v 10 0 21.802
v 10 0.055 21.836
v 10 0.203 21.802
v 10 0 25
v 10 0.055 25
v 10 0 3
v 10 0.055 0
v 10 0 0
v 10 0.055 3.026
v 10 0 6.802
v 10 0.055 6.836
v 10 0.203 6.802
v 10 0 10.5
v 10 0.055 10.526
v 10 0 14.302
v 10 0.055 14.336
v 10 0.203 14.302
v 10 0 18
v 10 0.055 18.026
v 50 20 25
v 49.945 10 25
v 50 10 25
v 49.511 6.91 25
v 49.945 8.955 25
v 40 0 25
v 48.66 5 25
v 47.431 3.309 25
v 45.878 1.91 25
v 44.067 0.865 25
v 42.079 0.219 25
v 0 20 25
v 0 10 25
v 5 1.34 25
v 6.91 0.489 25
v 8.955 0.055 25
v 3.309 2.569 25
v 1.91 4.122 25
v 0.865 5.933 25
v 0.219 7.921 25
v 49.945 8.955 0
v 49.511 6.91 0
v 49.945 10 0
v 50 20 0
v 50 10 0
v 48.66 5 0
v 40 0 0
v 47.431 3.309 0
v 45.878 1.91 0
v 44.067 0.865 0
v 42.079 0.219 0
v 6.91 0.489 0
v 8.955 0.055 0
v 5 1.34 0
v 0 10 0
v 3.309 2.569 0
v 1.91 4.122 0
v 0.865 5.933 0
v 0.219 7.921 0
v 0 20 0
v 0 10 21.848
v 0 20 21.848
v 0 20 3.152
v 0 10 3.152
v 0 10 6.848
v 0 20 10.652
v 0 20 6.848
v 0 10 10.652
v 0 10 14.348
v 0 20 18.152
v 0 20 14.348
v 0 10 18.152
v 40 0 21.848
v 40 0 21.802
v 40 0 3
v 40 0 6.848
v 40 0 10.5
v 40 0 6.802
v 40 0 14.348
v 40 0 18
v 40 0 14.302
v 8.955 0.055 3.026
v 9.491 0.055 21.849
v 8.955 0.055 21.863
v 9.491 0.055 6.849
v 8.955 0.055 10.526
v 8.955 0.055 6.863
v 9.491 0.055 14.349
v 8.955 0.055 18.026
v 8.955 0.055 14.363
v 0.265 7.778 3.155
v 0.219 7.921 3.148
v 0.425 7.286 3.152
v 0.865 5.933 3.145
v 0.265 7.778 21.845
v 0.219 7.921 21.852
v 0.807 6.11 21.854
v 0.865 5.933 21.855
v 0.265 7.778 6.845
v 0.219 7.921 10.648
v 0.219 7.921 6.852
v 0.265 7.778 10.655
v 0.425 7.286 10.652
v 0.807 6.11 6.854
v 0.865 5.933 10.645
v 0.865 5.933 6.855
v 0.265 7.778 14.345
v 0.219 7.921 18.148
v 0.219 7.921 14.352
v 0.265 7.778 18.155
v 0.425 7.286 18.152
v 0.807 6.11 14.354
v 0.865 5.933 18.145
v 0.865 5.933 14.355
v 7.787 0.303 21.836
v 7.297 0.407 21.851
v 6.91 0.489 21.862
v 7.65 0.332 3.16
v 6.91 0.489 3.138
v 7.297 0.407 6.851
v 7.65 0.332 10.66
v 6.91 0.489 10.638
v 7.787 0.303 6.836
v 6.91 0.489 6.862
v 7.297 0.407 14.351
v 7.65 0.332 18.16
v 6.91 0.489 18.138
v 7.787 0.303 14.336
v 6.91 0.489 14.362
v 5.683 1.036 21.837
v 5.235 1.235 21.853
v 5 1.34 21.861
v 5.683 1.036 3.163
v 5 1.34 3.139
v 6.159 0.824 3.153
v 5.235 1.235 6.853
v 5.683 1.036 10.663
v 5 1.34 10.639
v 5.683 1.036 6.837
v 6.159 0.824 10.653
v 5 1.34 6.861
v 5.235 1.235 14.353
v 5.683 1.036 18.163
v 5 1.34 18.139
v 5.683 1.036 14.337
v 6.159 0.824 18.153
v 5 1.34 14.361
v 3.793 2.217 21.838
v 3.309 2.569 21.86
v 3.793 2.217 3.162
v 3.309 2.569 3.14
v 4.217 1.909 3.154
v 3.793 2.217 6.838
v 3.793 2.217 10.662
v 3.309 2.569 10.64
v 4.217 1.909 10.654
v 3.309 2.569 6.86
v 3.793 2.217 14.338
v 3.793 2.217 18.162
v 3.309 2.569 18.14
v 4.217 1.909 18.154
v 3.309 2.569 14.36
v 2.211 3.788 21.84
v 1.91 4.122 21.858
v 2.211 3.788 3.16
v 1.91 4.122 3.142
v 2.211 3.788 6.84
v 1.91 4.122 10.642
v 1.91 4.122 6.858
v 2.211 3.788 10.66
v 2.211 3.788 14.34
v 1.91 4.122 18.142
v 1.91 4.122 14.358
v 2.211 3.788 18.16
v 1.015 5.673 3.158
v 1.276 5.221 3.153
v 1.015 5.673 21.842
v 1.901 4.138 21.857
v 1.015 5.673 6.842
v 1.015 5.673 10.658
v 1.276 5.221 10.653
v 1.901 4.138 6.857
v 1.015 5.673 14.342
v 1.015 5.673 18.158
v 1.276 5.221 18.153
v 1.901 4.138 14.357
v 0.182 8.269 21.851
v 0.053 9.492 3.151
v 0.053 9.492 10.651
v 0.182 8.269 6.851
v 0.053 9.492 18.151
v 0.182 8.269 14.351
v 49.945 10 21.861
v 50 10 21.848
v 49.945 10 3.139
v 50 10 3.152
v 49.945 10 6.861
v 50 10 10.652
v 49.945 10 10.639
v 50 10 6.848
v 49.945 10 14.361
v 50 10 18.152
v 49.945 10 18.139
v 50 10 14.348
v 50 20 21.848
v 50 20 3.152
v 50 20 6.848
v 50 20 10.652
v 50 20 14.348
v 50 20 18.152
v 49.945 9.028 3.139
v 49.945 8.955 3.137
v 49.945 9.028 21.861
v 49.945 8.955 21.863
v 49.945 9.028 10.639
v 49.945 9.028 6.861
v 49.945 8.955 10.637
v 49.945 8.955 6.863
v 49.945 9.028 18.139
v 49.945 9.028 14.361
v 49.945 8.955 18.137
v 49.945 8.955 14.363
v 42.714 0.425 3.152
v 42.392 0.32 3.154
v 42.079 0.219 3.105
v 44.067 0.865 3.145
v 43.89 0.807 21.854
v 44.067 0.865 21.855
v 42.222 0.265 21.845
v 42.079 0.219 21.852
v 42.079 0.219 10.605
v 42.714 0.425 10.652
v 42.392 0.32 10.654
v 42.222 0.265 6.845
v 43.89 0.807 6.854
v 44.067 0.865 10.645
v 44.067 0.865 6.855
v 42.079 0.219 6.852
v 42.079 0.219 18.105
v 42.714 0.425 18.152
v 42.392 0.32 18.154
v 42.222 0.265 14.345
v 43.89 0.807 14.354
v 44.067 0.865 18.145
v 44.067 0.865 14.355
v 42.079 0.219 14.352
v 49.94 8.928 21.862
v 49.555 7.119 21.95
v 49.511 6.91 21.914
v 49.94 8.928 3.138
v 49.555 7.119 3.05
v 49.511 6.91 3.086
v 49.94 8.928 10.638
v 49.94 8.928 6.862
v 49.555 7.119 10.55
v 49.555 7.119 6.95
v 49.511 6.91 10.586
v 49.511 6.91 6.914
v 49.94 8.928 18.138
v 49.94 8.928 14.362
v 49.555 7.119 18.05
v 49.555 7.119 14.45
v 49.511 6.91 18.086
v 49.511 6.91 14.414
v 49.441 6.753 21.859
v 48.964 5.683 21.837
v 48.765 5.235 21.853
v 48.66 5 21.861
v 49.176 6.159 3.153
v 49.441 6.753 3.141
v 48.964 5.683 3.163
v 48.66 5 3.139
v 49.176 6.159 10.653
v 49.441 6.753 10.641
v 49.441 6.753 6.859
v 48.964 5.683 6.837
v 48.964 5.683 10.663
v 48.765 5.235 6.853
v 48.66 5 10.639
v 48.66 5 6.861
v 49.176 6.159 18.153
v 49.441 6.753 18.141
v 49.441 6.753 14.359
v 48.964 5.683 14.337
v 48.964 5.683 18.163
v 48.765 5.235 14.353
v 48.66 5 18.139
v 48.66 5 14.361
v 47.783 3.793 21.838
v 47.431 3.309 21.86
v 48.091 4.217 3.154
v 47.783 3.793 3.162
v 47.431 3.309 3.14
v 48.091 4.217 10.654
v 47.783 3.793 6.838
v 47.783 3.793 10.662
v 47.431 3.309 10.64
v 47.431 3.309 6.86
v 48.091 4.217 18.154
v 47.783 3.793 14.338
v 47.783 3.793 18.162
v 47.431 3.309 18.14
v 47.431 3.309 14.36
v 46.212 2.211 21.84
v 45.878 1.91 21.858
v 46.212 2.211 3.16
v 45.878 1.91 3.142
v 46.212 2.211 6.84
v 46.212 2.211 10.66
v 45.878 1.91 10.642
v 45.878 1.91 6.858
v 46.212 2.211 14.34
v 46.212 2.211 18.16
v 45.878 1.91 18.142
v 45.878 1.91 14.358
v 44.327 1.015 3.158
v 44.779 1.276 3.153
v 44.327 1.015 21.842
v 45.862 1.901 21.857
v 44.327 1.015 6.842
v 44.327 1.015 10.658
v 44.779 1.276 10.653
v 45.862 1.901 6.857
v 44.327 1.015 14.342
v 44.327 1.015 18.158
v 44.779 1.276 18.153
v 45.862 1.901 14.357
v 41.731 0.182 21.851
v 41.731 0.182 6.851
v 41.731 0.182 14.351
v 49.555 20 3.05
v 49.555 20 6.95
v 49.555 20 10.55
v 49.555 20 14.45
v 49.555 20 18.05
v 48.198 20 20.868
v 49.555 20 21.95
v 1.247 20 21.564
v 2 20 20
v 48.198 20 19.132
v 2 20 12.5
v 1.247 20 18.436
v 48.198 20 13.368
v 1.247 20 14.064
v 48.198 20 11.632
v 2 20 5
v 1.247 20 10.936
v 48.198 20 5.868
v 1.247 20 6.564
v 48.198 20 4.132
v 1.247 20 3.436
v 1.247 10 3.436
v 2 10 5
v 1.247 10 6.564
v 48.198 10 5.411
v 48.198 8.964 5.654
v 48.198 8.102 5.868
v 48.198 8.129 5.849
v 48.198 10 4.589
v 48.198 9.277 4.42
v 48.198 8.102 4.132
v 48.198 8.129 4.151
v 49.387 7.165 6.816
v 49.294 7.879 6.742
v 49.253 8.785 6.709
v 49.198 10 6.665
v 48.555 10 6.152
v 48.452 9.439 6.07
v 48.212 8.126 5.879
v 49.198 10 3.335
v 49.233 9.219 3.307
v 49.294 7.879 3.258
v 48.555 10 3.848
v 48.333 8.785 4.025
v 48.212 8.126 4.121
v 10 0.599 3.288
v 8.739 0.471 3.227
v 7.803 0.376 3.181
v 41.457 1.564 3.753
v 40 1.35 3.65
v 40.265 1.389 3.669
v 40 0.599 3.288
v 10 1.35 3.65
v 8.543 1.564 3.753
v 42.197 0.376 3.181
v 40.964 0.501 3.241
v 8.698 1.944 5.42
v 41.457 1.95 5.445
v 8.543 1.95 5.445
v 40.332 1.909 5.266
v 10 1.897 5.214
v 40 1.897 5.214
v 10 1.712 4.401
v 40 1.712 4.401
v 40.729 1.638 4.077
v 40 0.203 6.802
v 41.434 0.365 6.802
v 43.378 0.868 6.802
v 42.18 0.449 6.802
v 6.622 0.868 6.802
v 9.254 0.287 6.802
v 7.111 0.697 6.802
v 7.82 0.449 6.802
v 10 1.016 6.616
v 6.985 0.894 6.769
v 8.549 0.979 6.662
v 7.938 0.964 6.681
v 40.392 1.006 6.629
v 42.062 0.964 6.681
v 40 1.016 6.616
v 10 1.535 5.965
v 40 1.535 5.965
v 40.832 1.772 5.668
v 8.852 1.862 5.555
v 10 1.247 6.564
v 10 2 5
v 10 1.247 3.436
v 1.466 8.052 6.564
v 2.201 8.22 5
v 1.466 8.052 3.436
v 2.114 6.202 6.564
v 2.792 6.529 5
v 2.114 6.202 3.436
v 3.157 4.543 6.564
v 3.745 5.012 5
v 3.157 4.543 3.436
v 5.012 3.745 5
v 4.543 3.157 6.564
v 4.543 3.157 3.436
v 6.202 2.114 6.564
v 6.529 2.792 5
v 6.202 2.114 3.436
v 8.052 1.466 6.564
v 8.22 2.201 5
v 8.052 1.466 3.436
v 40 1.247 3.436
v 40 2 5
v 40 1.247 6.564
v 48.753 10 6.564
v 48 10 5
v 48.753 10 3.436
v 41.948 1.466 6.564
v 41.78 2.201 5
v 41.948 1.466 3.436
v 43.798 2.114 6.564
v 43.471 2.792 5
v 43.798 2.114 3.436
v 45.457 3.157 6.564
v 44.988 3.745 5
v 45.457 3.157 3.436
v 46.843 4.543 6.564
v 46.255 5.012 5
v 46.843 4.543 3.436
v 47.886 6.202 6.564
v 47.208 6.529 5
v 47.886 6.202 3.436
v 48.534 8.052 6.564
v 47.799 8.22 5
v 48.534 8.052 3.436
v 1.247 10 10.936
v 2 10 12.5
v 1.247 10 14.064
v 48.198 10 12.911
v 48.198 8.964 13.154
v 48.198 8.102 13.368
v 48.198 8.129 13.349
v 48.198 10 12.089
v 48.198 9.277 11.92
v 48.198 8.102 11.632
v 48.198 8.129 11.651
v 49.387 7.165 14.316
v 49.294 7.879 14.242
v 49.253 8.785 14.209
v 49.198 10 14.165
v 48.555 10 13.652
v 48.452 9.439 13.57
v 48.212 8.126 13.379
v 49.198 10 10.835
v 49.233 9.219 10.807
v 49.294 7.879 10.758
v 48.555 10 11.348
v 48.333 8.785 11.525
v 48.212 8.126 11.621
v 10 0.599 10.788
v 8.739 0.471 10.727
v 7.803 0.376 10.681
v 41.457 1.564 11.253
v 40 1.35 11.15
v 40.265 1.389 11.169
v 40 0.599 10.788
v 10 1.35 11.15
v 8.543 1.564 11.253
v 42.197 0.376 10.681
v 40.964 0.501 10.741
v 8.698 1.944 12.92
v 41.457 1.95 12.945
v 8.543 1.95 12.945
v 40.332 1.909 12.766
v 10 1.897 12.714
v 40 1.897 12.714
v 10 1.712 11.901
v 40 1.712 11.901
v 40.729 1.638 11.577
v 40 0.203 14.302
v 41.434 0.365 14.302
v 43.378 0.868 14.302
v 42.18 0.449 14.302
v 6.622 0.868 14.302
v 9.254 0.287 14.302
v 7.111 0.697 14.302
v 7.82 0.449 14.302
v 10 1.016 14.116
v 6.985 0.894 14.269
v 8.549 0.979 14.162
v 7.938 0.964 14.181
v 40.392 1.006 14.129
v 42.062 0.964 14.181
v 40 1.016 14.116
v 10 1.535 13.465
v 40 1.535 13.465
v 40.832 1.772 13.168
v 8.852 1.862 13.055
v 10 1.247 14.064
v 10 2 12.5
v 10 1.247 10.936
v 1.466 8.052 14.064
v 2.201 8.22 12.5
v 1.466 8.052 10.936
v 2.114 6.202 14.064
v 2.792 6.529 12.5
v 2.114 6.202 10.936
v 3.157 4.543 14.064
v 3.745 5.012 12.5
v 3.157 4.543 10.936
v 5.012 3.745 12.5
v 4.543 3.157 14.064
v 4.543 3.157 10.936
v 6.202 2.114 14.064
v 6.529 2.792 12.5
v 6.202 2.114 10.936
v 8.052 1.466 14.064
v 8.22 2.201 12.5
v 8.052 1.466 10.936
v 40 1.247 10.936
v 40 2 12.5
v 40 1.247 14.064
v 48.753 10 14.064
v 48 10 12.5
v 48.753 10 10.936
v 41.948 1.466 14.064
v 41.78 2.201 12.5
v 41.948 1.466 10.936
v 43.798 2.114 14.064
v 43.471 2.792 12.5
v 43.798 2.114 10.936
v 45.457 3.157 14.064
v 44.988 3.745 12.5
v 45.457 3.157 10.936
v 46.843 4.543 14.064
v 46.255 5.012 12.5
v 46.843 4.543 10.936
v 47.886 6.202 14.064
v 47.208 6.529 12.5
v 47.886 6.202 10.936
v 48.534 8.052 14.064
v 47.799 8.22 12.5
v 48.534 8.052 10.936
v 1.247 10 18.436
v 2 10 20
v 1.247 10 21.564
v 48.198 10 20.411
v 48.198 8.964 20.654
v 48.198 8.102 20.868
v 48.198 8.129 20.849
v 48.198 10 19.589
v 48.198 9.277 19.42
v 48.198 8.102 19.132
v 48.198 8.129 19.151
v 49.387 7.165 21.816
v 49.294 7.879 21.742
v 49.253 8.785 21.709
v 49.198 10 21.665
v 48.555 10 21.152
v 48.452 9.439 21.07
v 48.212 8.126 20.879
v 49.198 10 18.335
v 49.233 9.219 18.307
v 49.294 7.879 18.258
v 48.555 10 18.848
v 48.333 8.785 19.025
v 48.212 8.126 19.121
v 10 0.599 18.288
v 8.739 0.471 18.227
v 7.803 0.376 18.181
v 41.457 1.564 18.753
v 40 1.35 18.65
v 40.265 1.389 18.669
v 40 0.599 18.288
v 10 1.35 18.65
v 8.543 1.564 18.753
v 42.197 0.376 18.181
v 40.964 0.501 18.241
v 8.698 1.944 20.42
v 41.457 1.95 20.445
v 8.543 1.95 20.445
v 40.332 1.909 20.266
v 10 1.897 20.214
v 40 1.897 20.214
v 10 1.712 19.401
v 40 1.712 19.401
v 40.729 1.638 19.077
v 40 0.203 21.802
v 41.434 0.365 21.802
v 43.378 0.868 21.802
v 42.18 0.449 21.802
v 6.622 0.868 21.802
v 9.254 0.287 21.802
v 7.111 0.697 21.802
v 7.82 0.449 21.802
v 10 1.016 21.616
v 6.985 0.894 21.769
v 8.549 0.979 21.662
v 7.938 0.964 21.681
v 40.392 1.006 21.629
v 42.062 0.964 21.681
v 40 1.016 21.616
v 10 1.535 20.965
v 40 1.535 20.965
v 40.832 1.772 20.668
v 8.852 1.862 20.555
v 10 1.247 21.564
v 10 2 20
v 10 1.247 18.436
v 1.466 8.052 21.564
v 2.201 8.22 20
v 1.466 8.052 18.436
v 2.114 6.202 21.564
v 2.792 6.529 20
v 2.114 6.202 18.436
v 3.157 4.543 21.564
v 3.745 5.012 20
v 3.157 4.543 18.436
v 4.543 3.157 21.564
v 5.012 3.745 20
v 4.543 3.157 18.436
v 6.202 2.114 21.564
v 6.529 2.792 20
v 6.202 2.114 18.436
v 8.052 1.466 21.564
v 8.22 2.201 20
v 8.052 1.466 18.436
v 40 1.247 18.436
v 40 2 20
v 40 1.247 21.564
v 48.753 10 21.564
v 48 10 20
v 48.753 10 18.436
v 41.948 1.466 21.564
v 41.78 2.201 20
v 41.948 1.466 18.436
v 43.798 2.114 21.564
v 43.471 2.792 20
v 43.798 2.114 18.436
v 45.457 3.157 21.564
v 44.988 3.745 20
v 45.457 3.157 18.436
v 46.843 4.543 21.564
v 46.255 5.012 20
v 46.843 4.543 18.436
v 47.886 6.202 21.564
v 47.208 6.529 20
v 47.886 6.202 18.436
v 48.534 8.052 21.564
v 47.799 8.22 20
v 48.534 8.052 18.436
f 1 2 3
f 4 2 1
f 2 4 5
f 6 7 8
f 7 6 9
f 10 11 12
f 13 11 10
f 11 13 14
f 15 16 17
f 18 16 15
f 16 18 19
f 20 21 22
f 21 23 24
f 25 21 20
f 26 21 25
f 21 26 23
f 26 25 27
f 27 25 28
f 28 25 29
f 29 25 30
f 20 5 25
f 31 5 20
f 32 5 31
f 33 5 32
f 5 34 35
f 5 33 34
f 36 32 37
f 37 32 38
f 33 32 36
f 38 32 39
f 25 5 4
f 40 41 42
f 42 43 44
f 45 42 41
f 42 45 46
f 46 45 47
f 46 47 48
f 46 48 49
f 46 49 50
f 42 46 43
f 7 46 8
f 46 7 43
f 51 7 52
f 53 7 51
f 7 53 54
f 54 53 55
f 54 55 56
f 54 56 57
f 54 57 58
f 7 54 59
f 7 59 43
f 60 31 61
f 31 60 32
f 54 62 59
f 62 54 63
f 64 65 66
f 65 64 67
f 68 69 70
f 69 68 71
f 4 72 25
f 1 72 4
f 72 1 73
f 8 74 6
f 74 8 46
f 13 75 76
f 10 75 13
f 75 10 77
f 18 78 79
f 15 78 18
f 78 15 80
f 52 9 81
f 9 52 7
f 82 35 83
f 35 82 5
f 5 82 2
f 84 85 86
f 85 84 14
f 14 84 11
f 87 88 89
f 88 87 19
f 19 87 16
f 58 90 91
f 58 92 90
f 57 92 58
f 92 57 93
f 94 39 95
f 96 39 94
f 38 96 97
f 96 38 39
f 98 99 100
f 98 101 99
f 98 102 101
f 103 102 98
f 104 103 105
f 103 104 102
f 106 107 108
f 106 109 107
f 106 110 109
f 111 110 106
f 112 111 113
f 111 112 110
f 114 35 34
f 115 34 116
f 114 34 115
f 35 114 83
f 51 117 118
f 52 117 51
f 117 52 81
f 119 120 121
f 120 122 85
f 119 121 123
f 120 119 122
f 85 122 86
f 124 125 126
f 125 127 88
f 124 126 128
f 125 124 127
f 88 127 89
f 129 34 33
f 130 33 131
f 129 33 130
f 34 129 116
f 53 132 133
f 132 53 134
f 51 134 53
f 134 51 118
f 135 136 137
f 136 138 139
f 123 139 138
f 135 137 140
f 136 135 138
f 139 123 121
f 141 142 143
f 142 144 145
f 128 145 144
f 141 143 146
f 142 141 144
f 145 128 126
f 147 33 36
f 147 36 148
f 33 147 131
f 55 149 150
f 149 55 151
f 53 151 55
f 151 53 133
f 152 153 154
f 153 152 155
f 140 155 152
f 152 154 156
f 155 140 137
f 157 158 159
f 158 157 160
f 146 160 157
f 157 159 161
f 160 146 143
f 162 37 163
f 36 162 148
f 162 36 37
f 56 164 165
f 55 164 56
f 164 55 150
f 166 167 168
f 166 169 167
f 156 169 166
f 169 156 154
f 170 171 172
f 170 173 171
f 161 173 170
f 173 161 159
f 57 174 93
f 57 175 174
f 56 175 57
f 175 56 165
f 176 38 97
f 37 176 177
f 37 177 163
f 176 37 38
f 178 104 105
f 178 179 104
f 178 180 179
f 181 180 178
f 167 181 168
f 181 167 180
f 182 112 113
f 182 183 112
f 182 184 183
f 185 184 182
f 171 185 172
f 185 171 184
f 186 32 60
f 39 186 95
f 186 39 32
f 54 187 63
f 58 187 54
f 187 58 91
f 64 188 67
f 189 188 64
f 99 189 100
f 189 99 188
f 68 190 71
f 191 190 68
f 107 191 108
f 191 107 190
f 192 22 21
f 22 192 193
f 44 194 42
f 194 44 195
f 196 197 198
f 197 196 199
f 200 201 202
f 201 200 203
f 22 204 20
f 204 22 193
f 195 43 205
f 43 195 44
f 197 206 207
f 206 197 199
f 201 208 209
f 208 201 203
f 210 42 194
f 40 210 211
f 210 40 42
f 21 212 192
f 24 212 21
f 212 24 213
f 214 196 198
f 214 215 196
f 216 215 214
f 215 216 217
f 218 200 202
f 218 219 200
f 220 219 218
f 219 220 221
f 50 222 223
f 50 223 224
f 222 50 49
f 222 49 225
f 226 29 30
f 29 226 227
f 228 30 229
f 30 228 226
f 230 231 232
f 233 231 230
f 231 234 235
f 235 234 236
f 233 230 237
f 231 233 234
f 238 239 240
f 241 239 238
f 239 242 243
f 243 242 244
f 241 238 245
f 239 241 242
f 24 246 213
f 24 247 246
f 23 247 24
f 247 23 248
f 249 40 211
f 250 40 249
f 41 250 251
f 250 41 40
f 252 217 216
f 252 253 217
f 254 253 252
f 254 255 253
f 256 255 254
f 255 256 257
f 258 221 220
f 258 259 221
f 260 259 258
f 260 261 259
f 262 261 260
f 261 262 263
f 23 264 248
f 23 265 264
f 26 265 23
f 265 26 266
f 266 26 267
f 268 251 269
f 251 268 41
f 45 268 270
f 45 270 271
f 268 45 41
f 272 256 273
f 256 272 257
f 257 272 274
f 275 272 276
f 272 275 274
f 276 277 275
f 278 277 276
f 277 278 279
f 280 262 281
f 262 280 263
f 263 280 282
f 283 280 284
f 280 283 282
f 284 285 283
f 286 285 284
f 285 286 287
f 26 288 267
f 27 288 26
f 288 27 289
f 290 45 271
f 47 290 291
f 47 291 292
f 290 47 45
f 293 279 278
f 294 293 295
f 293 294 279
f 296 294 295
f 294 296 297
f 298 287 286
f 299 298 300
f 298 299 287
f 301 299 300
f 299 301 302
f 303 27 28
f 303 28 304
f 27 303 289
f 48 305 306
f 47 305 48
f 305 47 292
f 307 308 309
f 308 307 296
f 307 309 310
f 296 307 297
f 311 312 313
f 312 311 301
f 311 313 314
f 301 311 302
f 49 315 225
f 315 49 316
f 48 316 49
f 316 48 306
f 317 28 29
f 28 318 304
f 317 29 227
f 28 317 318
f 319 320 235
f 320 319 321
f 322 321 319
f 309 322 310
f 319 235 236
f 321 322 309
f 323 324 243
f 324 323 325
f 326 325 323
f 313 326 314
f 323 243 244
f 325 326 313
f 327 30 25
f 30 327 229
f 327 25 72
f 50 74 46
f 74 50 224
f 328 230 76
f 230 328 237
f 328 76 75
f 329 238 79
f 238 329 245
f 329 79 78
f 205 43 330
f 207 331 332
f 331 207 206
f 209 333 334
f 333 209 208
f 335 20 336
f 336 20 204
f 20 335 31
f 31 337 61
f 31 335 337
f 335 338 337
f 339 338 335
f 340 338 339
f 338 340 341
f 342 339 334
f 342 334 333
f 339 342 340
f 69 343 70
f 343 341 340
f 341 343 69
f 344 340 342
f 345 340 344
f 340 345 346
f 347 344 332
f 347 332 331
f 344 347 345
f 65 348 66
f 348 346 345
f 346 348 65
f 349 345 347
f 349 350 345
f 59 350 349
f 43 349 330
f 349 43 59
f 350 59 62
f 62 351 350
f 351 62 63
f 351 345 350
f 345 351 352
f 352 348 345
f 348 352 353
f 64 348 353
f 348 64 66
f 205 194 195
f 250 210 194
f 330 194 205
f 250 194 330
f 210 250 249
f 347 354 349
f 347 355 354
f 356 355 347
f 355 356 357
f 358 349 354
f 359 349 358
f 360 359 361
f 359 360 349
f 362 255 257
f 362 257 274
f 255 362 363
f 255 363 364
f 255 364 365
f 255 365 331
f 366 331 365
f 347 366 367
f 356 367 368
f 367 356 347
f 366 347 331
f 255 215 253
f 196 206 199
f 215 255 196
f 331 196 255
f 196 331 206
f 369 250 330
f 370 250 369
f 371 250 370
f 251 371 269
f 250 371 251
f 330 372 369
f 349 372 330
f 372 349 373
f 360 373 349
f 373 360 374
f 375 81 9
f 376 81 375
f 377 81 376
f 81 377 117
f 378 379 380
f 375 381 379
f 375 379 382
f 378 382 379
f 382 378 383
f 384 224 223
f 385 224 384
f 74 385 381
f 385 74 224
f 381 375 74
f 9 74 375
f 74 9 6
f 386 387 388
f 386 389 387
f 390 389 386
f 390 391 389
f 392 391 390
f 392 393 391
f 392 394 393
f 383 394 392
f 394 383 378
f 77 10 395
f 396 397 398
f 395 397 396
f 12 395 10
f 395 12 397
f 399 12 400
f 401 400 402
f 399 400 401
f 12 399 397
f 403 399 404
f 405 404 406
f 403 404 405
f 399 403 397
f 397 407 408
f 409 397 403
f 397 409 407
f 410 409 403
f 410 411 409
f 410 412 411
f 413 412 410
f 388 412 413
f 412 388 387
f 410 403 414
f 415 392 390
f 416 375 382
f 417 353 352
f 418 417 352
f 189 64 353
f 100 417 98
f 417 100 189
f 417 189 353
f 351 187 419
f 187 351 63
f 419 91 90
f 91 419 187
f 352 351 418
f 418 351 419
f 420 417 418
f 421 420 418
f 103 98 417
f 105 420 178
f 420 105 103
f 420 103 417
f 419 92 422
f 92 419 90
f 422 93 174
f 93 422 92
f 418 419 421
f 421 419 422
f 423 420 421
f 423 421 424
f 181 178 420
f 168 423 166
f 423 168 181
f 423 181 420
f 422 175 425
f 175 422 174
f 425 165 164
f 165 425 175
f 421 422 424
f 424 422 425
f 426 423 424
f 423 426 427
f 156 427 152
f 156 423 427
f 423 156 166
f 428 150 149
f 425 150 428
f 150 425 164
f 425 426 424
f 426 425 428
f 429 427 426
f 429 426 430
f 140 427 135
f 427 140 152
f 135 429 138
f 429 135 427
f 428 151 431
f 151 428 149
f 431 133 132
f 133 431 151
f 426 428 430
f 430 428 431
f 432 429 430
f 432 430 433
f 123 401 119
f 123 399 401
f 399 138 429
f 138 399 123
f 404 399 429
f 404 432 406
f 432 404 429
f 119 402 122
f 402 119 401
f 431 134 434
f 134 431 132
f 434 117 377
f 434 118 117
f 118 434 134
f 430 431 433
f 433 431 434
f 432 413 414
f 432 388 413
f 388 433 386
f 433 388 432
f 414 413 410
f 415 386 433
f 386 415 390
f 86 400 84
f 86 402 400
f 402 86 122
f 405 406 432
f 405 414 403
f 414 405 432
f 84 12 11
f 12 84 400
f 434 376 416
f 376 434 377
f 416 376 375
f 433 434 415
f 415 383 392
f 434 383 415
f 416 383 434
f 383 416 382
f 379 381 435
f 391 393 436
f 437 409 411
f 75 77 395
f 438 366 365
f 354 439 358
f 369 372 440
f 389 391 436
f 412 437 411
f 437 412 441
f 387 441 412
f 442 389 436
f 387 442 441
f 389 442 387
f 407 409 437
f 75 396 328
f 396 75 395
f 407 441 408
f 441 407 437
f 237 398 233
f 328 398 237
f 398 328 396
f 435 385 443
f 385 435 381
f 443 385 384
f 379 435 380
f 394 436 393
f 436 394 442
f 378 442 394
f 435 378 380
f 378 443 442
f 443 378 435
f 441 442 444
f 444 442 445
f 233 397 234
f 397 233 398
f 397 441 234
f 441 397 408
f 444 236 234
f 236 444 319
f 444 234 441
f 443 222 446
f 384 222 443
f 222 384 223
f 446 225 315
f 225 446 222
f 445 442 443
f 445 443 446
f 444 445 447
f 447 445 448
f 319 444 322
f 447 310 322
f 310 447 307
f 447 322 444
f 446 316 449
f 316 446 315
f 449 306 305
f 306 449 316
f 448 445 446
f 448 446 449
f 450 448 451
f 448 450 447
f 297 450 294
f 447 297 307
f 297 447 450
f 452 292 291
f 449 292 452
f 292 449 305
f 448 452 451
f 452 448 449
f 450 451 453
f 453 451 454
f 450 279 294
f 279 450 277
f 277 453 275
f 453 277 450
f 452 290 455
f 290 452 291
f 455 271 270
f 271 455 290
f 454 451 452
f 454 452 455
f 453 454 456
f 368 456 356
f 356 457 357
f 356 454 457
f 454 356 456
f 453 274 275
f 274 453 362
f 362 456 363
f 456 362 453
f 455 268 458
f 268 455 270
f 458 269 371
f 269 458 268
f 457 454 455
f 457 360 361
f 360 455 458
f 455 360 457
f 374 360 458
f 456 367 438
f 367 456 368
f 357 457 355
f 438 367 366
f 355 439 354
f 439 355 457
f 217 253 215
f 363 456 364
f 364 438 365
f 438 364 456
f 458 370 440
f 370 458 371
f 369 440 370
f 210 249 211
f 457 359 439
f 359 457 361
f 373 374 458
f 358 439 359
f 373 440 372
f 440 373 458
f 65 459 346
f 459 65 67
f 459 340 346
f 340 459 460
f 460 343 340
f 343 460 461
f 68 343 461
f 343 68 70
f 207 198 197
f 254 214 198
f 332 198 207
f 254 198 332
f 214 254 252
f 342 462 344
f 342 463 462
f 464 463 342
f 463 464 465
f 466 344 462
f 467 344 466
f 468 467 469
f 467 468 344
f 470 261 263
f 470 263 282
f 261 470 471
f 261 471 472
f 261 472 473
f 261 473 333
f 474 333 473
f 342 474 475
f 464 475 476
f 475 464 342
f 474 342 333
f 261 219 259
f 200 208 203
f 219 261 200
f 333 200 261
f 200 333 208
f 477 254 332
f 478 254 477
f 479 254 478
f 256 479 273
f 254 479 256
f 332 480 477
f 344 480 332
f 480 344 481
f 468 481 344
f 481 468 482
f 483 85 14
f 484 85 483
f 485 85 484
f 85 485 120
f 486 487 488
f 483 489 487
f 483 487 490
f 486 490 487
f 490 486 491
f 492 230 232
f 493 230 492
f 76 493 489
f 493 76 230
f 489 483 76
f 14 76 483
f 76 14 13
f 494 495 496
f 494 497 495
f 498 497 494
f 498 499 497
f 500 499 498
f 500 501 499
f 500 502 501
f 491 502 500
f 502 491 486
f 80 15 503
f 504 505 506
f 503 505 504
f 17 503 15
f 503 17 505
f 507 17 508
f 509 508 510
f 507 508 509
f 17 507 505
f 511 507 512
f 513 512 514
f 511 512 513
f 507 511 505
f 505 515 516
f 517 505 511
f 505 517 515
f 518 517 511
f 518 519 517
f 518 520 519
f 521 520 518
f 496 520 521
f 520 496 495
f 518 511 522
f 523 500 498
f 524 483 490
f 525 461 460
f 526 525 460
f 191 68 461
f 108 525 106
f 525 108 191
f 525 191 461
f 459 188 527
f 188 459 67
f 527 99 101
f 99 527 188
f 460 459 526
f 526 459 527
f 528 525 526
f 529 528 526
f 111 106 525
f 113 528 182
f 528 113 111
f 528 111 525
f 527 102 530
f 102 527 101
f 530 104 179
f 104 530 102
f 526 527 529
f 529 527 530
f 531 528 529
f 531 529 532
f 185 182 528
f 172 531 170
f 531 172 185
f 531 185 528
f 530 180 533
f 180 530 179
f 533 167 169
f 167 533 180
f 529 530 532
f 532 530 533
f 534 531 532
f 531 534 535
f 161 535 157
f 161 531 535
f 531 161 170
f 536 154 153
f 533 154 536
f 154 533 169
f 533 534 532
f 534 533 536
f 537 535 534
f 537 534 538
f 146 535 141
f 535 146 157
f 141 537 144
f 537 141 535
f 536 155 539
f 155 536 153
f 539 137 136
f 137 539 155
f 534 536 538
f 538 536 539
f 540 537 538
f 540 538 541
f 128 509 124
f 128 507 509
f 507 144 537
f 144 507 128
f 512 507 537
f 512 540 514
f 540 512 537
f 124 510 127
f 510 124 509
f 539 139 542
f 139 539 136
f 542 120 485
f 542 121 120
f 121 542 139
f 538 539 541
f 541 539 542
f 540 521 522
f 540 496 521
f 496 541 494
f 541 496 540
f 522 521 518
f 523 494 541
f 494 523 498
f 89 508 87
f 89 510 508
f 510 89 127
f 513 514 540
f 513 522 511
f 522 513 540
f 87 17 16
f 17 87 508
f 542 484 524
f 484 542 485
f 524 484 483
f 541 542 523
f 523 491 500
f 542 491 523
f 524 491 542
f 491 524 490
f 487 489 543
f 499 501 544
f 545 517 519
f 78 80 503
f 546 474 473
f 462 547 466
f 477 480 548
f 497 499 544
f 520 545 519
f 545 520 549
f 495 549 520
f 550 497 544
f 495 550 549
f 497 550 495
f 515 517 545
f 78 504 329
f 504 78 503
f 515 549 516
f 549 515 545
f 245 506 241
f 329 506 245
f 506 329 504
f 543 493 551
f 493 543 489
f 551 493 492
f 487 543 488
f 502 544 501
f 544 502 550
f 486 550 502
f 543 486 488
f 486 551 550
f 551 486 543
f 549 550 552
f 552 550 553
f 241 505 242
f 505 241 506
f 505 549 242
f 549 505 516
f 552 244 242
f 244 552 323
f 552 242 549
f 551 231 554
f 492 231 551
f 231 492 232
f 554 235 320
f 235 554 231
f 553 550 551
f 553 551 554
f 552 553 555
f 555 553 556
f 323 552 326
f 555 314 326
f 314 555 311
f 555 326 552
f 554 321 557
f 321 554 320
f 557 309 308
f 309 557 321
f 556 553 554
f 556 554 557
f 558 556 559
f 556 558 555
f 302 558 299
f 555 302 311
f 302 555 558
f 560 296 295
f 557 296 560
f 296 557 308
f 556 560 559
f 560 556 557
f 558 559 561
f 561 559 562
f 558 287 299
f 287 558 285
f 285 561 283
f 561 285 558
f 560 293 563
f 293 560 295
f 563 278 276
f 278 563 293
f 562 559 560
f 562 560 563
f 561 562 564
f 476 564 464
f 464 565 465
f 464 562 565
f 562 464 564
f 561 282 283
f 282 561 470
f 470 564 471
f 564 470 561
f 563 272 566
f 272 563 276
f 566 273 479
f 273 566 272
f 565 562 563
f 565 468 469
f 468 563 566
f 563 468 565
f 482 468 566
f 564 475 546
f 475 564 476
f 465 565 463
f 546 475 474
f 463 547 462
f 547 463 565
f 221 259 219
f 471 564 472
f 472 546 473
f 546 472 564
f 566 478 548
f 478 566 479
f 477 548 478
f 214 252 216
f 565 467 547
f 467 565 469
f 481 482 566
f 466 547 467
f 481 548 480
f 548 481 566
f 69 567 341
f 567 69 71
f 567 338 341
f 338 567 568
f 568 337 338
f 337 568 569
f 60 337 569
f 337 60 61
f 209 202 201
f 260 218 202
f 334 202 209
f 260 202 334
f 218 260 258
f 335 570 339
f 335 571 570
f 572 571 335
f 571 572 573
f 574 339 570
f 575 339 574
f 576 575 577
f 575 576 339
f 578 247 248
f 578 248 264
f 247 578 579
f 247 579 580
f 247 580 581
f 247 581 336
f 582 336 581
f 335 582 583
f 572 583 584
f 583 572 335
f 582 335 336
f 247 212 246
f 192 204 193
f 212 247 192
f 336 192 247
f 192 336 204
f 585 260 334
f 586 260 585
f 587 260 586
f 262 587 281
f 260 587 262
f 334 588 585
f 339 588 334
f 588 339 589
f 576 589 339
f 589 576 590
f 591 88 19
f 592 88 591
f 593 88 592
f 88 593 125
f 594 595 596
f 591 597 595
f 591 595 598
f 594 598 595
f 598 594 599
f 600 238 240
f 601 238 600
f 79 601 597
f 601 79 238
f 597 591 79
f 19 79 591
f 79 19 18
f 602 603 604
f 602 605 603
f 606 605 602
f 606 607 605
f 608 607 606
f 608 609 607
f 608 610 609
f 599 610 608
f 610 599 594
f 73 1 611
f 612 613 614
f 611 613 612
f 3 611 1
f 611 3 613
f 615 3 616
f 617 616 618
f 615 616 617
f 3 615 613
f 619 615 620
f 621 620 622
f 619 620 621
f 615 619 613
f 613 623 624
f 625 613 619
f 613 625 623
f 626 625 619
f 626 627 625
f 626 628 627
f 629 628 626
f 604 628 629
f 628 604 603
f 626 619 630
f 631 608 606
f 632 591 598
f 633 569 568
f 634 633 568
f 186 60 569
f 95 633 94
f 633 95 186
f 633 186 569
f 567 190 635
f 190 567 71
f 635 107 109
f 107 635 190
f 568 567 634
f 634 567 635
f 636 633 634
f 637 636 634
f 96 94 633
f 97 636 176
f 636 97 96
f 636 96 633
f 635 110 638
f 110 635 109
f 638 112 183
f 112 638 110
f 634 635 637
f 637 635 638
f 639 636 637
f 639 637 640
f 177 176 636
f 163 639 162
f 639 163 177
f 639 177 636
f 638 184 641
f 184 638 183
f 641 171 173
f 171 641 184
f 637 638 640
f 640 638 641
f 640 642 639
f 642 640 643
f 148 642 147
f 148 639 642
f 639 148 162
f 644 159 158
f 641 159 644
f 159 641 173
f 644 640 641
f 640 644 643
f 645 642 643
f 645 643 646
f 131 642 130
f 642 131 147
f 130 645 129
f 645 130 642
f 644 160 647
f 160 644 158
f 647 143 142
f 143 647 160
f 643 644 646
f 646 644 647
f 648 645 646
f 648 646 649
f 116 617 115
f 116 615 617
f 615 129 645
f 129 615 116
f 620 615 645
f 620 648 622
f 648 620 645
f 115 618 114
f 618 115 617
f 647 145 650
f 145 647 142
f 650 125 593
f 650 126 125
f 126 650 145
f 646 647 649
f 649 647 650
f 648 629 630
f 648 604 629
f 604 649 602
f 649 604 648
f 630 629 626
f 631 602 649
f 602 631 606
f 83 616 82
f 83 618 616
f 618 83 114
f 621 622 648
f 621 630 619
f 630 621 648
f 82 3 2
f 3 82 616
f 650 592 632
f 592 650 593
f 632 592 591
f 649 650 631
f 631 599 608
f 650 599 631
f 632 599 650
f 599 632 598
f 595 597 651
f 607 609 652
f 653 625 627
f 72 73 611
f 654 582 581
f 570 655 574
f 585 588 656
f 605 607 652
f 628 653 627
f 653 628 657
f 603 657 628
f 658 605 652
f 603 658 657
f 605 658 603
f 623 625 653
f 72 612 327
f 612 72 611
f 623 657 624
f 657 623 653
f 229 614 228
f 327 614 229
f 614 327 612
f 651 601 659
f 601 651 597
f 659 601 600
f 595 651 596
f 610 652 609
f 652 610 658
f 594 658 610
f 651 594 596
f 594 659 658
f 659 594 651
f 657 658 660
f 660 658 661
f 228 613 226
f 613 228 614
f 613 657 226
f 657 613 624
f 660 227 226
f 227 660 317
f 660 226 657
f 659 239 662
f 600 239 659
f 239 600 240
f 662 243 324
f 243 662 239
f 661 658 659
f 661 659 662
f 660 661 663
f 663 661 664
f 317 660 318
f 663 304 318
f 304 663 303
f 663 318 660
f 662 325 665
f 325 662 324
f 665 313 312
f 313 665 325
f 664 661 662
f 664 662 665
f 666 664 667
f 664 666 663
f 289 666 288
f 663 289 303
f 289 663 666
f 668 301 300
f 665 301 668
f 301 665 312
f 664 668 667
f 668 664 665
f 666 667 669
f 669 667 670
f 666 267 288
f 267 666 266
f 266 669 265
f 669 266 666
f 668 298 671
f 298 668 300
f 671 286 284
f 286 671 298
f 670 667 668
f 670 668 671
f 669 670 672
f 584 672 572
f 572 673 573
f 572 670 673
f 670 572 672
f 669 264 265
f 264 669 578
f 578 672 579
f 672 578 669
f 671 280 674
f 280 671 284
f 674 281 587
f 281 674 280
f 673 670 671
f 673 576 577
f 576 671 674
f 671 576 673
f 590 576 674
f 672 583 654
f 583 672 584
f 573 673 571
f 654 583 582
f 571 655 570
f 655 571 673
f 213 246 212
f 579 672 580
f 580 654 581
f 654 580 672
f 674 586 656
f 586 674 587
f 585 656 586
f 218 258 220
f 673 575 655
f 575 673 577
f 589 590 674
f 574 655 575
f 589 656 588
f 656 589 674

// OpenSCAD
// file: accents/accent/accent.scad
module left_side_accent(width, radius) {
    rotate(a=-90, v=[1, 0, 0]) {
        cylinder(r=radius, h=width);
    }
}

module right_side_accent(length, width, radius) {
    translate([length, 0, 0]) {
        left_side_accent(
            width=width,
            radius=radius
        );
    }
}

module front_accent(length, radius) {
    rotate(a=90, v=[0, 1, 0]) {
        cylinder(r=radius, h=length);
    }
}

module left_curved_accent(edge_radius, radius) {
    translate([edge_radius, edge_radius, 0]) {
        rotate_extrude(angle=90) {
            translate([-edge_radius, 0, 0]) {
                circle(r=radius);
            }
        }
    }
}

module right_curved_accent(length, edge_radius, radius) {
    translate([length, 0, 0]) {
        rotate(a=90, v=[0, 0, 1]) {
            left_curved_accent(
                edge_radius=edge_radius,
                radius=radius
            );
        }
    }
}

module accent(length, width, edge_radius, radius) {
    left_side_accent(
        width=width,
        radius=radius
    );

    right_side_accent(
        length=length,
        width=width,
        radius=radius
    );

    front_accent(
        length=length,
        radius=radius
    );

    left_curved_accent(
        edge_radius=edge_radius,
        radius=radius
    );

    right_curved_accent(
        length=length,
        edge_radius=edge_radius,
        radius=radius
    );
}
// file: rounded-cube/remove-edges/remove-edges.scad
module left_cylinder(height, radius) {
    translate([radius, radius, 0])
        cylinder(r=radius, h=height);
}

module left_remove_edge(height, radius) {
    difference() {
        cube([radius, radius, height]);
        left_cylinder(height=height, radius=radius);
    }
}

module right_remove_edge(length, height, radius) {
    translate([length, 0, 0]) {
        rotate(a=90, v=[0, 0, 1]) {
            left_remove_edge(height=height, radius=radius);
        }
    }
}

// origin is front left bottom of cube being altered
module remove_edges(length, height, radius) {
    left_remove_edge(height=height, radius=radius);
    right_remove_edge(length=length, height=height, radius=radius);
}
// file: accents/accents.scad
use <accent/accent.scad>

module accents(length, width, height, edge_radius, radius, count, margin) {
    // 2 accents are required so that margin makes sense from top and bottom
    assert(count>=2, "Must have at least two accents!");

    top_accent_height = height-margin;
    // how much height the accents cover
    accent_height = height-margin*2;
    accent_spacing = accent_height/(count-1);

    for (i = [0 : count-1]) {
        this_accent_height = margin + i*accent_spacing;

        translate([0, 0, this_accent_height]) {
            accent(
                length=length,
                width=width,
                edge_radius=edge_radius,
                radius=radius
            );
        }
    }

}
// file: rounded-cube/rounded-cube.scad
use <remove-edges/remove-edges.scad>

module rounded_cube(length, width, height, edge_radius) {
    difference() {
        cube([length, width, height]);
        remove_edges(length=length, height=height, radius=edge_radius);
    }
}
// file: rounded-cube-with-accents.scad
use <rounded-cube/rounded-cube.scad>
use <accents/accents.scad>

module rounded_cube_with_accents(length, width, height, edge_radius, accent_radius, accent_count, accent_margin) {
    difference() {
        rounded_cube(
            length=length,
            width=width,
            height=height,
            edge_radius=edge_radius
        );

        accents(
            length=length,
            width=width,
            height=height,
            edge_radius=edge_radius,
            radius=accent_radius,
            count=accent_count,
            margin=accent_margin
        );
    }
}
// main file
use <rounded-cube-with-accents.scad>

length=50;
width=20;
height=25;
edge_radius=10;
accent_radius=2;
accent_count=3;
accent_margin=5;

rounded_cube_with_accents(
    length=length,
    width=width,
    height=height,
    edge_radius=edge_radius,
    accent_radius=accent_radius,
    accent_count=accent_count,
    accent_margin=accent_margin
);
